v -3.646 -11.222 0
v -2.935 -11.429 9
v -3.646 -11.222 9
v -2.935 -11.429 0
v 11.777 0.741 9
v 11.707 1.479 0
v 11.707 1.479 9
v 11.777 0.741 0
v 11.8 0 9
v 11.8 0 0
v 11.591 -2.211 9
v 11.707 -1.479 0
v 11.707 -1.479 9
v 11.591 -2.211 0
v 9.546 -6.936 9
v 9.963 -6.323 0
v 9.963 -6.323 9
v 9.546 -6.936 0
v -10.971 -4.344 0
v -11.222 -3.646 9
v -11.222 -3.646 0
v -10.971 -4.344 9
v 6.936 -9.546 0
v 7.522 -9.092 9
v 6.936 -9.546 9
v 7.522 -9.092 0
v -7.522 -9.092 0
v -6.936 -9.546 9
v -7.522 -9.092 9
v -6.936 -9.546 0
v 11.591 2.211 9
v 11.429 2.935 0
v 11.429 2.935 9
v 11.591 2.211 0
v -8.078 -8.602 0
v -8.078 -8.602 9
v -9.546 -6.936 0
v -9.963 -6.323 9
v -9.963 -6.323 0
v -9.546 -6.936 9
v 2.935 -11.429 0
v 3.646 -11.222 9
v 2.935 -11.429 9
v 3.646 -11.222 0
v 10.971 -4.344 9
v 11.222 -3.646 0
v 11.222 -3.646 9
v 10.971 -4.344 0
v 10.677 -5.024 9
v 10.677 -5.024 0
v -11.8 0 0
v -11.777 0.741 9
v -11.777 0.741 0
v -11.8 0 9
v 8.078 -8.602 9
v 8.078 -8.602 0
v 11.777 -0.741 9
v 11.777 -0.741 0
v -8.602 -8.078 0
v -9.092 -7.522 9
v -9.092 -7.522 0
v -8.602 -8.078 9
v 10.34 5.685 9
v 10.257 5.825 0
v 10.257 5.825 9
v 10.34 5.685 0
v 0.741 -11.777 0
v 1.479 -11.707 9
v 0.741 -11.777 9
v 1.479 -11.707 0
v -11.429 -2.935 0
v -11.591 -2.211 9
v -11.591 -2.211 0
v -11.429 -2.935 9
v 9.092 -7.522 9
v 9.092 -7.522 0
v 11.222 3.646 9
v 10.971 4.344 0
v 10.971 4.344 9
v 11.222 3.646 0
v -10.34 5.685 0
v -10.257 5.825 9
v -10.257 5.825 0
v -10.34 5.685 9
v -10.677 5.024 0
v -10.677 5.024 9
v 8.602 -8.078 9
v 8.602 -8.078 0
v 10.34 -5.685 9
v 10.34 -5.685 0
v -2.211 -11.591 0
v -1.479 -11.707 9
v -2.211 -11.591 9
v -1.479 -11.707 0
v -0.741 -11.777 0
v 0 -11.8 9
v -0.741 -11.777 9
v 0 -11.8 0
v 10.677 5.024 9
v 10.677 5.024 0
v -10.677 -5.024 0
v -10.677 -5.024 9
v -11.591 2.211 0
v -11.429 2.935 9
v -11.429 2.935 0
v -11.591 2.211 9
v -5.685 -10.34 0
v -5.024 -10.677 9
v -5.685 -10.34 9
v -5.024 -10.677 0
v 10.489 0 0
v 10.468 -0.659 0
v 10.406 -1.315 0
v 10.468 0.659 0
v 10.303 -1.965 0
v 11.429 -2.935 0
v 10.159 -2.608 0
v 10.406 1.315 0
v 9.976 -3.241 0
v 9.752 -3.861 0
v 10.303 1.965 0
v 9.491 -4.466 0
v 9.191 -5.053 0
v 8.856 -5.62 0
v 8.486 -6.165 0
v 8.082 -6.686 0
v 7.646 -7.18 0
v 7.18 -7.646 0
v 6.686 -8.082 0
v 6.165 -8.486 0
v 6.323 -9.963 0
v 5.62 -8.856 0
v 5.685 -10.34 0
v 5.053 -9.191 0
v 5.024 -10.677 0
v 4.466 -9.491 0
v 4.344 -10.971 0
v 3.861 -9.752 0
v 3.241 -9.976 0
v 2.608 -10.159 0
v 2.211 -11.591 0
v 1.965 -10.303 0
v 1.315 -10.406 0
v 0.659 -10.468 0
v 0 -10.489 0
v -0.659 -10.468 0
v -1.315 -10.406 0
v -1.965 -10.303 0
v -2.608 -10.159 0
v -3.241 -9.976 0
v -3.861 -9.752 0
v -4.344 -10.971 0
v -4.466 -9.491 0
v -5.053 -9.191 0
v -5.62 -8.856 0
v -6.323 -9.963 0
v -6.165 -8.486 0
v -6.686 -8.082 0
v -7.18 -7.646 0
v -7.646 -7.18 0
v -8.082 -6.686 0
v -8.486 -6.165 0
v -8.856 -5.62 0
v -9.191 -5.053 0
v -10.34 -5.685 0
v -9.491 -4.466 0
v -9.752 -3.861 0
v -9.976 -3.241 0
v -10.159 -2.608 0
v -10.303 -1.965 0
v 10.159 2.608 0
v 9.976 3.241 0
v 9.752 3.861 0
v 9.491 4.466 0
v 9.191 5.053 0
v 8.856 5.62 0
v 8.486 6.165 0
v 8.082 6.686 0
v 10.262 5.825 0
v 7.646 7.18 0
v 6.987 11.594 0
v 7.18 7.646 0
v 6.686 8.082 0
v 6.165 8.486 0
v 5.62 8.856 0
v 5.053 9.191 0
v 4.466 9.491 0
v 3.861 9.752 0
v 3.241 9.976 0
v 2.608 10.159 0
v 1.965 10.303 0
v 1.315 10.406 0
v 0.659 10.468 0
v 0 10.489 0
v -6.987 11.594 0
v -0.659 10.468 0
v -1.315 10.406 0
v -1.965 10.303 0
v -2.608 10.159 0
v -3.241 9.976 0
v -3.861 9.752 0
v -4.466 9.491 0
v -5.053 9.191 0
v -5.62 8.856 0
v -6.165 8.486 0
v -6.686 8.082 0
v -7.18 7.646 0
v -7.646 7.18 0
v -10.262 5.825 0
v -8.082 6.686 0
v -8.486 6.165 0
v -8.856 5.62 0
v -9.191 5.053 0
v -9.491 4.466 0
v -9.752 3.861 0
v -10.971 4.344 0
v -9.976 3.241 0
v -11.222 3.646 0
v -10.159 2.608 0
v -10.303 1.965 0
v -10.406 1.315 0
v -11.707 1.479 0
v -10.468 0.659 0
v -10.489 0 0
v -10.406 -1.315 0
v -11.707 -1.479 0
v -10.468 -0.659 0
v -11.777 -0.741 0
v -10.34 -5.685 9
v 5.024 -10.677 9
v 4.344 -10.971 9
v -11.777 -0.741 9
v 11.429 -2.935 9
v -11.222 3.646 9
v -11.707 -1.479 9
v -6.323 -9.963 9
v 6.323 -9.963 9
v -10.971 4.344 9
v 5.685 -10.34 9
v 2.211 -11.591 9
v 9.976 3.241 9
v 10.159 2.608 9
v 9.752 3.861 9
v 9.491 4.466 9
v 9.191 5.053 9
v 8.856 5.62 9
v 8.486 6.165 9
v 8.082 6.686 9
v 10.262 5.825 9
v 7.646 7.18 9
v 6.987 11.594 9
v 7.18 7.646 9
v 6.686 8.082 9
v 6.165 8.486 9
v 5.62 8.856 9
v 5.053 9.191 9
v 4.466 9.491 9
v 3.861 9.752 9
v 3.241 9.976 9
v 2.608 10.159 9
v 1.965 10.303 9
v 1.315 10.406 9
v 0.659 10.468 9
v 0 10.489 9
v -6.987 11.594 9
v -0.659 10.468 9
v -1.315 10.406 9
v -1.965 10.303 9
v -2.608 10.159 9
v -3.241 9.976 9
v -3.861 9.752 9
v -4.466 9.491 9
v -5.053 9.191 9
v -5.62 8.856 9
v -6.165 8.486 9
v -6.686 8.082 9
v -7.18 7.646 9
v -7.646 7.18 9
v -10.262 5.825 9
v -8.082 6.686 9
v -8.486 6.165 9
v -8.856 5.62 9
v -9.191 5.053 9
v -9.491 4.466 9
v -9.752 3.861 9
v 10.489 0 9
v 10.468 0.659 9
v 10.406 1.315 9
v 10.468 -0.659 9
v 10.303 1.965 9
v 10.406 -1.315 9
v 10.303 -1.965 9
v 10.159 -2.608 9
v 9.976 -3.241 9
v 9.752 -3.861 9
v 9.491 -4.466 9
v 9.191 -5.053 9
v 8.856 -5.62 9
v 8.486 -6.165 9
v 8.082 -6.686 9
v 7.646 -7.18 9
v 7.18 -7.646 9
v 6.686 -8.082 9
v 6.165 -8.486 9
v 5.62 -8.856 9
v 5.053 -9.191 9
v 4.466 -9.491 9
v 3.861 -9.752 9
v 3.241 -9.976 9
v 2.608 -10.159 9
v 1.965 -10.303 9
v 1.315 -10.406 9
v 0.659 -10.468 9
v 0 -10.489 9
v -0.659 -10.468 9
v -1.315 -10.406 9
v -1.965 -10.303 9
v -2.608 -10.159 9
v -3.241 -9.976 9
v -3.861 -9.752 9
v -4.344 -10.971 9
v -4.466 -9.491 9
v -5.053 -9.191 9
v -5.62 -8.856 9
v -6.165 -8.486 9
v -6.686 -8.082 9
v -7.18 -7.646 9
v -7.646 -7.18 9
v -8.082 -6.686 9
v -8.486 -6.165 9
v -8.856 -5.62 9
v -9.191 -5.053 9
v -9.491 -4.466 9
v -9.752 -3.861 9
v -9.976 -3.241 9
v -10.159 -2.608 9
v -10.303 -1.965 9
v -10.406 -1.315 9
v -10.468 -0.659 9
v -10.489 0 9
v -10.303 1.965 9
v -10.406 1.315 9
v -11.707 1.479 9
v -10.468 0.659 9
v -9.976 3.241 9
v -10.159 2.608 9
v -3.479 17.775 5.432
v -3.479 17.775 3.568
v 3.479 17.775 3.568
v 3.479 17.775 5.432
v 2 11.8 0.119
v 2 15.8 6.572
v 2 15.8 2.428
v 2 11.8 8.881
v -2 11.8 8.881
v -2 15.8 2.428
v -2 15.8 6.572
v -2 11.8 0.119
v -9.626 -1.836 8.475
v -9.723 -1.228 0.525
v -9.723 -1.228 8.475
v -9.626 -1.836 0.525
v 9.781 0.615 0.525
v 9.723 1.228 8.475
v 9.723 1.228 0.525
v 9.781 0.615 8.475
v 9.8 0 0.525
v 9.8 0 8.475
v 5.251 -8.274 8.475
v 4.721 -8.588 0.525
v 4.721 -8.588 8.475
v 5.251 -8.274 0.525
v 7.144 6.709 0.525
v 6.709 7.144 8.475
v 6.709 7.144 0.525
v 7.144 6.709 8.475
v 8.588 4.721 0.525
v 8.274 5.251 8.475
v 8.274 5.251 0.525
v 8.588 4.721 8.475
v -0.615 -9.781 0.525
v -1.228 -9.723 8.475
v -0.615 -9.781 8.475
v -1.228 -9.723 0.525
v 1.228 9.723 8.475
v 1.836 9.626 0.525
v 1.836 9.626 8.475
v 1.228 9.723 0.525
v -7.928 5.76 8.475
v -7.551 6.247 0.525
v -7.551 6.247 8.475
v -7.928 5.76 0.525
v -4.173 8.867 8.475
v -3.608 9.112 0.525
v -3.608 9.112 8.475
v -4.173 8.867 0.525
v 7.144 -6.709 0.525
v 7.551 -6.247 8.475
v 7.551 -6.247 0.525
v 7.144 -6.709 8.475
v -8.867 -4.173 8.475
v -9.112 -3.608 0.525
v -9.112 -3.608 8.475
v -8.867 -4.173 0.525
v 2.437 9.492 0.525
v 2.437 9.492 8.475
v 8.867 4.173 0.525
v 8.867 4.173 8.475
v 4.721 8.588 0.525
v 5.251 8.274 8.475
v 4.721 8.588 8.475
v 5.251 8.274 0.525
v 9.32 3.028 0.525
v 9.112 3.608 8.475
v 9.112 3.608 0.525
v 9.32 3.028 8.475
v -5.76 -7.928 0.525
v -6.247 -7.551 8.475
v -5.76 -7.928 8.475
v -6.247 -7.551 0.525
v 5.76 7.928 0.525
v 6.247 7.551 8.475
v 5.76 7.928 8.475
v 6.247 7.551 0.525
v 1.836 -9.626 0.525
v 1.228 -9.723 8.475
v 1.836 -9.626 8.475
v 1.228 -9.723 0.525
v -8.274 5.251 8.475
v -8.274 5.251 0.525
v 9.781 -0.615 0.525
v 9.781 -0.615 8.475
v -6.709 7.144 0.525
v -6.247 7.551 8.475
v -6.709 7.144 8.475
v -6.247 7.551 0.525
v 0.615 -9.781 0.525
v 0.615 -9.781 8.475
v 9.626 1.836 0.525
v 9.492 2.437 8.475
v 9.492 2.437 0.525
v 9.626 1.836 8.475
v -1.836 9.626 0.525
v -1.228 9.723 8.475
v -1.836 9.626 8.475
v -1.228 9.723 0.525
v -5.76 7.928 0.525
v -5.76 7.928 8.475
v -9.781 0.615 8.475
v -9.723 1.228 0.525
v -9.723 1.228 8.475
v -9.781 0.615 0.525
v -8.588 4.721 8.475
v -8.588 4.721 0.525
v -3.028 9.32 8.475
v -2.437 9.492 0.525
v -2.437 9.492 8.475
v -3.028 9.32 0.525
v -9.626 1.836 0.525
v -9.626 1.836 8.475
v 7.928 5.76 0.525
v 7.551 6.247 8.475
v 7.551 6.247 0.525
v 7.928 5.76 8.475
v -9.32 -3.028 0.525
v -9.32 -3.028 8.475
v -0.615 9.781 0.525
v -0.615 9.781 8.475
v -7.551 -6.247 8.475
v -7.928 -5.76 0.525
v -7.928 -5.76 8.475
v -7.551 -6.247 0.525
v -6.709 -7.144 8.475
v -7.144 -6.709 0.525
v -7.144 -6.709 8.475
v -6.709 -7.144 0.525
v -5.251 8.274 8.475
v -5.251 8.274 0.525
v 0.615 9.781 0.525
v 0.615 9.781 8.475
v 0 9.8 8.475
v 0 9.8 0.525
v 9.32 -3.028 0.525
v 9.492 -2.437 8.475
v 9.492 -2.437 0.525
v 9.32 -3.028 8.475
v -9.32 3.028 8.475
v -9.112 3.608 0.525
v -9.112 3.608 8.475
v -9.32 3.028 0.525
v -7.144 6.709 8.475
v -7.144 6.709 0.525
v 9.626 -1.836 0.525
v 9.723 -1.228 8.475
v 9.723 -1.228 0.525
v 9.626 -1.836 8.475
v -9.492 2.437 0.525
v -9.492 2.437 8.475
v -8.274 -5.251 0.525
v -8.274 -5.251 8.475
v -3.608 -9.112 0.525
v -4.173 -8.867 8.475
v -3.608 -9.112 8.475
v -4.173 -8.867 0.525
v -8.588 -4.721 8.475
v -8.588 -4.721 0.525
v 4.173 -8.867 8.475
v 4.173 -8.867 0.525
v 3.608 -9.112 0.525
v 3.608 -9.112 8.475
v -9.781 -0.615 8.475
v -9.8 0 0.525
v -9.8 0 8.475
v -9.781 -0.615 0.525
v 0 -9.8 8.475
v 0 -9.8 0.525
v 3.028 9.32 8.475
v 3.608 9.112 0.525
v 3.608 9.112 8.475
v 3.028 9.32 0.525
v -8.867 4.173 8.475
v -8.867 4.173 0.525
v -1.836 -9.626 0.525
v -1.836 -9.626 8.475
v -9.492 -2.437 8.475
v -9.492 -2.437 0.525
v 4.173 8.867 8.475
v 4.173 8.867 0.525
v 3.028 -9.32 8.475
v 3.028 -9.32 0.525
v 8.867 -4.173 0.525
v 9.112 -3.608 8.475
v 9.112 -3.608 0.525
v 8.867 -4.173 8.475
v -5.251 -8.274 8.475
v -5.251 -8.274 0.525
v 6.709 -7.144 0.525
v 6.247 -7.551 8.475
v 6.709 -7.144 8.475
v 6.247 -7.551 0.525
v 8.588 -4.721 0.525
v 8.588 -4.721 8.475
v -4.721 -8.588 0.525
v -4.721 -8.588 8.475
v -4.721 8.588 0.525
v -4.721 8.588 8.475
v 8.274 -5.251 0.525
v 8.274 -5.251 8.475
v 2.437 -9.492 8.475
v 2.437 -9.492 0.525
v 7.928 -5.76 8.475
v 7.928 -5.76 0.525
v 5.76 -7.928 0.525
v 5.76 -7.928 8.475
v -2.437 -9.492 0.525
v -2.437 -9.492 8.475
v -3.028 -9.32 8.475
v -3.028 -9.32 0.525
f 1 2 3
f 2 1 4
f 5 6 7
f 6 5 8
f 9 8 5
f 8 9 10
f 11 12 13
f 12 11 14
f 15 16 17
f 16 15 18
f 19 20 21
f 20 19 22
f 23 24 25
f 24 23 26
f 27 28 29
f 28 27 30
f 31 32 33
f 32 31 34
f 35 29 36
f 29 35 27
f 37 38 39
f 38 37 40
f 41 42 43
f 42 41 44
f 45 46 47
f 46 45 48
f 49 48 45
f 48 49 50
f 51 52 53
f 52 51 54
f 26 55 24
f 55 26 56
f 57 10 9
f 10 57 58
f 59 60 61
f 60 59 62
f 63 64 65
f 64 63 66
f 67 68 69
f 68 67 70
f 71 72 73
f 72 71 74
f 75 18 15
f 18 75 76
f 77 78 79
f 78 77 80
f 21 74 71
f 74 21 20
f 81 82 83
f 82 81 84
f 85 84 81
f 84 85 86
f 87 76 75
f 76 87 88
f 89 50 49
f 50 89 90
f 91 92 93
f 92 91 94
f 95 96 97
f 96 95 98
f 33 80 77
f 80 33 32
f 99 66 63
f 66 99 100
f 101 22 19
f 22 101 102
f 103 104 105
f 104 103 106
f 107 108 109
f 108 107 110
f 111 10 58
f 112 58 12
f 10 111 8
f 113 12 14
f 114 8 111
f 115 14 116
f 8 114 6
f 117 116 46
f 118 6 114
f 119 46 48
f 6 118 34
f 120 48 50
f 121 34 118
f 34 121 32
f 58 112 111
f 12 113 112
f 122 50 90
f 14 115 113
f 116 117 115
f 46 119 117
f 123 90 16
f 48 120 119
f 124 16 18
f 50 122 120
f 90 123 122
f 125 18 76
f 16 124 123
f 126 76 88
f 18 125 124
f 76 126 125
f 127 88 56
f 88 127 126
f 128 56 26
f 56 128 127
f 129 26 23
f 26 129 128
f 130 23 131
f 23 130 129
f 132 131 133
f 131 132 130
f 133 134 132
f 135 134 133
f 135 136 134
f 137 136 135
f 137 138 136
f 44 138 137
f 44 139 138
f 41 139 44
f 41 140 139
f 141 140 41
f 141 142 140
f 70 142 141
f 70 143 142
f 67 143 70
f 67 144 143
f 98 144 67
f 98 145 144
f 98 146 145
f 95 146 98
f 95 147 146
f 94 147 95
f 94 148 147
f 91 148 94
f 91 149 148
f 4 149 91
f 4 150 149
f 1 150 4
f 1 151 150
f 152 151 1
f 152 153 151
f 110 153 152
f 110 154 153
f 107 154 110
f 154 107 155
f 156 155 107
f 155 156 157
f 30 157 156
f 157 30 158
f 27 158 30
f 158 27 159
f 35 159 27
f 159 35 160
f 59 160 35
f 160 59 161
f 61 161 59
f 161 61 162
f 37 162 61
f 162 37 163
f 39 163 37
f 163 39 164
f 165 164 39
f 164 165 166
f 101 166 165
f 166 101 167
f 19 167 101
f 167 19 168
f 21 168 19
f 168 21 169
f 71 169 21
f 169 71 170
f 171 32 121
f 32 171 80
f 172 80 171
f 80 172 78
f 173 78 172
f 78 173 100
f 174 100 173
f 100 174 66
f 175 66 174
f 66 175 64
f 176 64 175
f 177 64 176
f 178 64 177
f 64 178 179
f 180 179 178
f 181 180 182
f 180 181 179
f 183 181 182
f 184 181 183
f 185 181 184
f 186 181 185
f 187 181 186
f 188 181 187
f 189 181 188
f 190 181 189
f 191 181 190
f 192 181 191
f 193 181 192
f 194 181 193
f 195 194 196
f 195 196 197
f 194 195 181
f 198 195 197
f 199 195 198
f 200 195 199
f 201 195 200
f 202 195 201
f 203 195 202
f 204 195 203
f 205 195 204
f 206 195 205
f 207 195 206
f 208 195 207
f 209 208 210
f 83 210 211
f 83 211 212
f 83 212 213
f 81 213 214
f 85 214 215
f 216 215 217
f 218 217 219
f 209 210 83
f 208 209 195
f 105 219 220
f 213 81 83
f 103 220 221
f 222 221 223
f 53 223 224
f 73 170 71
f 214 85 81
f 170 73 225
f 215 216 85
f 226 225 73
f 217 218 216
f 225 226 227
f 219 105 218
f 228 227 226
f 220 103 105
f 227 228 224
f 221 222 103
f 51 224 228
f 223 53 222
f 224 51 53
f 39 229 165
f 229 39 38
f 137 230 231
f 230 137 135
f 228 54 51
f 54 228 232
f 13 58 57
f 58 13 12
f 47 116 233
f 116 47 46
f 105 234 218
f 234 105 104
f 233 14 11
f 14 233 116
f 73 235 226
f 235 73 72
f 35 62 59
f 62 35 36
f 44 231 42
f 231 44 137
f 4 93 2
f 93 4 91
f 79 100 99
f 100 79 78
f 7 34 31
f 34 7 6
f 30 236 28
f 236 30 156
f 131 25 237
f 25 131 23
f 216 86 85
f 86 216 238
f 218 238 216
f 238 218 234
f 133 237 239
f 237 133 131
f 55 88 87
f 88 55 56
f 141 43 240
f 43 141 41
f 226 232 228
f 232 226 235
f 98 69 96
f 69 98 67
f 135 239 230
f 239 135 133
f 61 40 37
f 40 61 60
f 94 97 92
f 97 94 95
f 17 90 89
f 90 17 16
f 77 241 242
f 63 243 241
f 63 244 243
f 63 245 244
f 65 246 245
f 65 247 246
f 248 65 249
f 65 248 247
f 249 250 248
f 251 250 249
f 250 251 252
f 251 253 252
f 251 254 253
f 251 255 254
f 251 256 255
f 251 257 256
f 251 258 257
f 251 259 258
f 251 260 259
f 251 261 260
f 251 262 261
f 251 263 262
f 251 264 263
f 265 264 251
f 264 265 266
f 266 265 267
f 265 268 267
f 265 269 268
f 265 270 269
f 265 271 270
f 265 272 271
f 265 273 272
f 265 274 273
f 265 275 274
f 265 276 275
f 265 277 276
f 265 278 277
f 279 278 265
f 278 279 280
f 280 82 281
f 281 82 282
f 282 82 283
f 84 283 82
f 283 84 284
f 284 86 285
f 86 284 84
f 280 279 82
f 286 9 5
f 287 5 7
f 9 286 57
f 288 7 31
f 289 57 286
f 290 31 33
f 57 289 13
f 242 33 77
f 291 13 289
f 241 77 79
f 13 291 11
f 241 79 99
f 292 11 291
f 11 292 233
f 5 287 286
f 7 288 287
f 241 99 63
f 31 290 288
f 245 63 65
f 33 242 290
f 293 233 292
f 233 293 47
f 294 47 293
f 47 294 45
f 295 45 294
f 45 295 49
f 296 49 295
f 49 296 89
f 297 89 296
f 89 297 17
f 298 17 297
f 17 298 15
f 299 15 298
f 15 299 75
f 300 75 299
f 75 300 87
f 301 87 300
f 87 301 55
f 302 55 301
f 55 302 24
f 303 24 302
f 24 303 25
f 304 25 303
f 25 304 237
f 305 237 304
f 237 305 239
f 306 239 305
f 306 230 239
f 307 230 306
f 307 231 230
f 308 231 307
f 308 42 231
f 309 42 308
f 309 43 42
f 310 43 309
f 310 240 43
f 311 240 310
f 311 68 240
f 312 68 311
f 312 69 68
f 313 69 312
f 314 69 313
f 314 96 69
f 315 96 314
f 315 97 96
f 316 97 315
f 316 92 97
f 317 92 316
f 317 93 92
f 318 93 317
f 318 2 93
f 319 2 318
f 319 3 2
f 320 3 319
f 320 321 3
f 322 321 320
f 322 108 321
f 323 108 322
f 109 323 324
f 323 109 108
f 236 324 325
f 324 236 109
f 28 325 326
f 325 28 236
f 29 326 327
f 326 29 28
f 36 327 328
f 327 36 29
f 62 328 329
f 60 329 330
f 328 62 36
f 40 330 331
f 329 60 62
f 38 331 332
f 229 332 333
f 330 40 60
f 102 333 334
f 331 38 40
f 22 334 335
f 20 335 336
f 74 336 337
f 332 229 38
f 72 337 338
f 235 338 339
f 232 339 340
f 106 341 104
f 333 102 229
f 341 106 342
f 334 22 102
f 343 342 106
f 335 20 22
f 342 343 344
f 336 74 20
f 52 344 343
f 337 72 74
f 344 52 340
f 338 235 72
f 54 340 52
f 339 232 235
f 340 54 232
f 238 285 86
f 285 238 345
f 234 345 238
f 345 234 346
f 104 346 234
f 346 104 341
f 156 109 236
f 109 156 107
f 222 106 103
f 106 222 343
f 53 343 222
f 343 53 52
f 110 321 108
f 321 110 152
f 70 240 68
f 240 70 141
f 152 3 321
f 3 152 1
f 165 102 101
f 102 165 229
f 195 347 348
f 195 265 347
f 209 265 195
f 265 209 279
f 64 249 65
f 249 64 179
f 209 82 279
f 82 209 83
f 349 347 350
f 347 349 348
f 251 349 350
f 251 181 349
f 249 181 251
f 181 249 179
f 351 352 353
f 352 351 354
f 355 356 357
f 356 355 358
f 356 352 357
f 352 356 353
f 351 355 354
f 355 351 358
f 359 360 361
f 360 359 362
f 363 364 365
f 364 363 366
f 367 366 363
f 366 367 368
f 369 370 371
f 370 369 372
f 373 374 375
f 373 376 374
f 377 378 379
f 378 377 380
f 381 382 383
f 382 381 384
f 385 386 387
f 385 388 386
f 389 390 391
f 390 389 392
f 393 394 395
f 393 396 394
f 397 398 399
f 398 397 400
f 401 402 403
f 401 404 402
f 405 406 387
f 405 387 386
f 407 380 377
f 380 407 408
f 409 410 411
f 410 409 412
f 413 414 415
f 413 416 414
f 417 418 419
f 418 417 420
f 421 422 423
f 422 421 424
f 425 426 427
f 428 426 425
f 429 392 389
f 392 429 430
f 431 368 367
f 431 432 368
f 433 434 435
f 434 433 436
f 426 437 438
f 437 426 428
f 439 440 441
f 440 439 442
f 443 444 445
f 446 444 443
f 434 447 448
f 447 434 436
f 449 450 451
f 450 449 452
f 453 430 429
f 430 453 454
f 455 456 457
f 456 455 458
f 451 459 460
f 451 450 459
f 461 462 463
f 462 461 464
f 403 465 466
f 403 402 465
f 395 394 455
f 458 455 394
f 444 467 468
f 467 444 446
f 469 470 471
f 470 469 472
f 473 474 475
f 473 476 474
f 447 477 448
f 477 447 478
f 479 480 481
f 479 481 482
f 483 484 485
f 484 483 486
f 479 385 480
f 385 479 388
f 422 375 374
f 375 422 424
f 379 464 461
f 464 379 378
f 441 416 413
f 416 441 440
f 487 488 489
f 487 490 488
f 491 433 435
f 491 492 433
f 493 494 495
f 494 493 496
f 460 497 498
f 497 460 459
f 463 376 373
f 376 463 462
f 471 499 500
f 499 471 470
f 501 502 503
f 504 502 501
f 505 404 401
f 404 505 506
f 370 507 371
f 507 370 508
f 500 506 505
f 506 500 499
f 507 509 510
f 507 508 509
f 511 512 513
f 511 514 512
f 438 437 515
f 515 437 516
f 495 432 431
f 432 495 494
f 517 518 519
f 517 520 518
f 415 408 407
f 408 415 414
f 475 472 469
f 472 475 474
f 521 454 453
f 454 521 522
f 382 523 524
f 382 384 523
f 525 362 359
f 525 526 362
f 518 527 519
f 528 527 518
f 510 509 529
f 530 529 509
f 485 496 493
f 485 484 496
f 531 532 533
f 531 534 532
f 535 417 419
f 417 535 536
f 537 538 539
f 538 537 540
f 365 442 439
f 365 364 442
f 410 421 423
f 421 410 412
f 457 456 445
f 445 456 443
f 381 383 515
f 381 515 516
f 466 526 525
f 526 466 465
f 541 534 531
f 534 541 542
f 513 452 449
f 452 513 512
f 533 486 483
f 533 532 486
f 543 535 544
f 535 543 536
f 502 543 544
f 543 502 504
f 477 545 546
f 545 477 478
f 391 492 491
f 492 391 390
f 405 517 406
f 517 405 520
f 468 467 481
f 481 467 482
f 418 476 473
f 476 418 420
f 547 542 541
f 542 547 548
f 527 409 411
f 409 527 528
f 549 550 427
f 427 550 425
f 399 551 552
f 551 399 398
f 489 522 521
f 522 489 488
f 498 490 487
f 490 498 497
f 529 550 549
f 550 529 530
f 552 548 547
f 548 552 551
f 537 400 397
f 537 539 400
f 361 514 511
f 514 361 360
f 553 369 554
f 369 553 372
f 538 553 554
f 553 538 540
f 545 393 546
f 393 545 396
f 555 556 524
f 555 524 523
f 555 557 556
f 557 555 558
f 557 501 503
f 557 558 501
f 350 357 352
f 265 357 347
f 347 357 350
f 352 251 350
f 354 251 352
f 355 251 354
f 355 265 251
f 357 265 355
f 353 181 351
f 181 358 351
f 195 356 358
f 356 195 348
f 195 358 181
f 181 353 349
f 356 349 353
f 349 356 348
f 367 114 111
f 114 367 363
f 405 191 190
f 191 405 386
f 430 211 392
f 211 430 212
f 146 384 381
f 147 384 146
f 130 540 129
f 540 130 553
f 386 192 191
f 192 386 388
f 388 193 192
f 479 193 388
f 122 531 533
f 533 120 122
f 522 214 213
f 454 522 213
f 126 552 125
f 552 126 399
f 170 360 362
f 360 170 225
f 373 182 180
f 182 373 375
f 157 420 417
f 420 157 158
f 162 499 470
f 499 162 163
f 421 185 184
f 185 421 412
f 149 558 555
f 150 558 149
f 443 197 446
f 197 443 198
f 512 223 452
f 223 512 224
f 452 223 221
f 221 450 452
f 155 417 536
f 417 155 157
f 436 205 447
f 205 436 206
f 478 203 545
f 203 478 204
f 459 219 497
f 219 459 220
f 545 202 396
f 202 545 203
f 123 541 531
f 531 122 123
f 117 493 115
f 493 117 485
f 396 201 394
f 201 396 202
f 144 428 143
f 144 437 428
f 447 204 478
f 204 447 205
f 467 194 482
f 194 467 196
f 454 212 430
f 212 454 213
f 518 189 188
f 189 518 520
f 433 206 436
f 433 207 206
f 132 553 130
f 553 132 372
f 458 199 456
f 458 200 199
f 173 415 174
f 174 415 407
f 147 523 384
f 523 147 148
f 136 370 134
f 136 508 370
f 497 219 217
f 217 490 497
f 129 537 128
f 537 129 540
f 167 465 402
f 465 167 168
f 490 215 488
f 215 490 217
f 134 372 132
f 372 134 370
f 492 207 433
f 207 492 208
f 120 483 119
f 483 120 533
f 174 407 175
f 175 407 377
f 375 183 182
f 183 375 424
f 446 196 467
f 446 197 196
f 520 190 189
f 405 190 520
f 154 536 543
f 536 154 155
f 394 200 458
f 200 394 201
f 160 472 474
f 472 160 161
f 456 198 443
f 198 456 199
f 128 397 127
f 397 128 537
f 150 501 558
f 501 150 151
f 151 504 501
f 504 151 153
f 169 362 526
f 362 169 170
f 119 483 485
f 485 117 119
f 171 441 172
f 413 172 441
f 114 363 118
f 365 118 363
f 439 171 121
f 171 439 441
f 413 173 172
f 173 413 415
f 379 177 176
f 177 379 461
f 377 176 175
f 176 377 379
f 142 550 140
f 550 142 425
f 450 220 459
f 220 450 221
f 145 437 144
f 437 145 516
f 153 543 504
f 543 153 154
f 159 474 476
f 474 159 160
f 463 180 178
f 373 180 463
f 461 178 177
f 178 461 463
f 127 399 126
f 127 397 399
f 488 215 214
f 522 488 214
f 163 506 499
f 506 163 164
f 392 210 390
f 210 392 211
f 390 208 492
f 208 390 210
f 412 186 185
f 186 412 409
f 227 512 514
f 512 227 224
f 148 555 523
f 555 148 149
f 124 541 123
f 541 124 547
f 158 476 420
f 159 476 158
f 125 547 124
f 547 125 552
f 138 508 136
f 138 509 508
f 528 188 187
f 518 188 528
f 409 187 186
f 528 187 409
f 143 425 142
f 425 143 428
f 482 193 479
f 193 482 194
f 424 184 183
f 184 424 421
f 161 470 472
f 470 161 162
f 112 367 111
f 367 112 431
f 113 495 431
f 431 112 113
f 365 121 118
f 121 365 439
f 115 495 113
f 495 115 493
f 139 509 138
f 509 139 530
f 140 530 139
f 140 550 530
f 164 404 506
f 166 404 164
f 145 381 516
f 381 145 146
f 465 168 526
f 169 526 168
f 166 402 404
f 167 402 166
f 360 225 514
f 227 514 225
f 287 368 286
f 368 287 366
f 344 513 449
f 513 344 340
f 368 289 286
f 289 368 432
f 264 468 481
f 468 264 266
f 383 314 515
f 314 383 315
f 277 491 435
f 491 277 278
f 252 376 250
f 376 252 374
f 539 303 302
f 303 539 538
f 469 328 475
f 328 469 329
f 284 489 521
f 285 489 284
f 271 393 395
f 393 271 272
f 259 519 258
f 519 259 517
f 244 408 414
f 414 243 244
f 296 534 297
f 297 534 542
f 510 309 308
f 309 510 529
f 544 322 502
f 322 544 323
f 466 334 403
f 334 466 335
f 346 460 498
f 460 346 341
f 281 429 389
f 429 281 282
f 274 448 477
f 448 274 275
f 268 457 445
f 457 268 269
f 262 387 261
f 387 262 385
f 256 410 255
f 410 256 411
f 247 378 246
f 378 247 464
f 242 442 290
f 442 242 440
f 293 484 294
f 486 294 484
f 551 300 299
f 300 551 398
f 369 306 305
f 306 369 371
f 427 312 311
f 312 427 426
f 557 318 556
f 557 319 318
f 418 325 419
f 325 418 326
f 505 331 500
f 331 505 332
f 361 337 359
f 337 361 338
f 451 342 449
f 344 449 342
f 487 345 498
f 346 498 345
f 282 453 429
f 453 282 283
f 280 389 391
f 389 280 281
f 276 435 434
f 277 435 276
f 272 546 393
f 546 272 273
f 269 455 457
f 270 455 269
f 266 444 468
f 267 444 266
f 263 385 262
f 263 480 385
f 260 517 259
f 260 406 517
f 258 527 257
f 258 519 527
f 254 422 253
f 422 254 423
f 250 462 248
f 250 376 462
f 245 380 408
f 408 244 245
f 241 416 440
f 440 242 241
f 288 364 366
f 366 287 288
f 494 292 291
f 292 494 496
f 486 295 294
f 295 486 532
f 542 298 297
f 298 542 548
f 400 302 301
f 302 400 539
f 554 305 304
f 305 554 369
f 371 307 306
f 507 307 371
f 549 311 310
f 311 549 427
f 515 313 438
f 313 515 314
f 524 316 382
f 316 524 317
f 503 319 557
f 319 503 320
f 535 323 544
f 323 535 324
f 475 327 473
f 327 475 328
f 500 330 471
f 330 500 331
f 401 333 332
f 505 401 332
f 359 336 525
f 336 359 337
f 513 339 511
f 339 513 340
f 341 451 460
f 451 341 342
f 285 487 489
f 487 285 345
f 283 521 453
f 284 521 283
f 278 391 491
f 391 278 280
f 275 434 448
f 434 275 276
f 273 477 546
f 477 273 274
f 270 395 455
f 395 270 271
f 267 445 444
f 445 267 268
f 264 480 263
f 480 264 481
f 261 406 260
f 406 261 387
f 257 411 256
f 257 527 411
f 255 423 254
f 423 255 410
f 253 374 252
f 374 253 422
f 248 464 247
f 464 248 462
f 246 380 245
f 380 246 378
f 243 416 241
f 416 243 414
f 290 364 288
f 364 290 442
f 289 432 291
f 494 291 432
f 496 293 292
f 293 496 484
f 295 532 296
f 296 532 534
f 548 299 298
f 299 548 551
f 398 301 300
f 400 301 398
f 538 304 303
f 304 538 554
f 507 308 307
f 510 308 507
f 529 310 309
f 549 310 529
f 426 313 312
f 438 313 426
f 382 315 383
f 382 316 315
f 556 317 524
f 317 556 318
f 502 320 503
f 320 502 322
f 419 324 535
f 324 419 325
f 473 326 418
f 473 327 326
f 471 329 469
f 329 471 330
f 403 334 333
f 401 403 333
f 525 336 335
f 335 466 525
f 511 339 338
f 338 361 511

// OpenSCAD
// preview[view:north east, tilt:top]

$fn=100;

function sqr(x) = pow(x,2);
function sqrt(x) = pow(x, 1/2);

function getx(c, r, sc, s=1) =	let (cx=c[0], cy=c[1], px=sc[0], py=sc[1]) ((sqr(r)*(px-cx)+(s*r*(py-cy)*sqrt(sqr(px-cx)+sqr(py-cy)-sqr(r)))) /
			(sqr(px-cx)+sqr(py-cy)))
			+cx;

function gety(c, r, sc, s=1) =	let (cx=c[0], cy=c[1], px=sc[0], py=sc[1]) ((sqr(r)*(py-cy)+(s*r*(px-cx)*sqrt(sqr(px-cx)+sqr(py-cy)-sqr(r)))) /
			(sqr(px-cx)+sqr(py-cy)))
			+cy;
			
// Get center of similitude, either internal or external		
// s=-1 for external and 1 for internal
function GetSimCentre (c0, r0, c1, r1, s=-1) = let (a=c0[0], b=c0[1], c=c1[0], d=c1[1]) [(c*r0+s*a*r1)/(r0+s*r1), (d*r0+s*b*r1)/(r0+s*r1)];

// c=centre of circle, r=radius, sc=center of similitude
// s selects which tangent point on circle depending on whether 1 or -1
function GetTangent (c, r, sc, s=1) = [getx(c, r, sc, s), gety(c, r, sc, s=-s)];

Ring_Size = 19.6;//[12.4:0.5 <12.4mm>,12.8:1 <12.8mm>,13.2:1.5 <13.2mm>,13.6:2 <13.6mm>,14:2.5 <14mm>,14.4:3 <14.4mm>,14.8:3.5 <14.8mm>,15.2:4 <15.2mm>,15.6:4.5 <15.6mm>,16:5 <16mm>,16.4:5.5 <16.4mm>,16.8:6 <16.8mm>,17.2:6.5 <17.2mm>,17.6:7 <17.6mm>,18:7.5 <18mm>,18.4:8 <18.4mm>,18.8:8.5 <18.8mm>,19.2:9 <19.2mm>,19.6:9.5 <19.6mm>,20:10 <20mm>,20.4:10.5 <20.4mm>,20.8:11 <20.8mm>,21.2:11.5 <21.2mm>,21.6:12 <21.6mm>,22:12.5 <22mm>,22.4:13 <22.4mm>,22.8:13.5 <22.8mm>,23.2:14 <23.2mm>,23.6:14.5 <23.6mm>,24:15 <24mm>,24.4:15.5 <24.4mm>,24.8:16 <24.8mm>]

//mm
Ring_Width = 9;//[8:12]

//mm
Ring_Thickness = 2;//[.8,1.2,1.6,2,2.4,2.8,3.2,3.6,4]

//mm
Holder_Size = 4;//[3,4,5]

//mm
Hole_Size = 4;//[3,4,5]

Outer_Radius = (Ring_Size+Ring_Thickness*2)/2;

hook_holder_ring();

module hook_holder_ring(){

difference()
{
  
    difference()
    {
        union()
        {
            // outer ring
            cylinder(r=Outer_Radius, h=Ring_Width);
                
            // hook holder standoff
            c0 = [0, 0];
            r0 = Outer_Radius;
            c1 = [0, Outer_Radius + Hole_Size];
            r1 = Holder_Size;

            // Get center of similitude, either internal or external		
            // s=-1 for external and 1 for internal
            sc = GetSimCentre(c0, r0, c1, r1, s=-1); 

            // Points on C0
            t0 = GetTangent(c0, r0, sc, s=1);
            t1 = GetTangent(c0, r0, sc, s=-1);

            // Points on C1
            t2 = GetTangent(c1, r1, sc, s=1);
            t3 = GetTangent(c1, r1, sc, s=-1);

            linear_extrude (height=Ring_Width)
            polygon ([t0, t2, t3, t1]);
        }

        // hook hole
        translate([-Hole_Size/2,Outer_Radius,0])
        cube([Hole_Size,Hole_Size,Ring_Width]); 

        // finger hole
        cylinder(r=Ring_Size/2, h=Ring_Width);
    }

    // chamfers
    translate([0,0,Ring_Width/2])
    {
        // top chamfer
        translate([0,Outer_Radius+Holder_Size/2,Ring_Width])
        rotate([-30,0,0])
        cube([50,20,10], center=true);

        // bottom chamfer
        translate([0,Outer_Radius+Holder_Size/2,-Ring_Width])
        rotate([30,0,0])
        cube([50,20,10], center=true);
    }

    // lower inner bevel
    translate([0,0,-Ring_Thickness/2])
    cylinder(r1=Outer_Radius, r2=0, h=Ring_Width);

    // upper inner bevel
    translate([0,0,Ring_Thickness/2])
    cylinder(r2=Outer_Radius, r1=0, h=Ring_Width);
}

}
